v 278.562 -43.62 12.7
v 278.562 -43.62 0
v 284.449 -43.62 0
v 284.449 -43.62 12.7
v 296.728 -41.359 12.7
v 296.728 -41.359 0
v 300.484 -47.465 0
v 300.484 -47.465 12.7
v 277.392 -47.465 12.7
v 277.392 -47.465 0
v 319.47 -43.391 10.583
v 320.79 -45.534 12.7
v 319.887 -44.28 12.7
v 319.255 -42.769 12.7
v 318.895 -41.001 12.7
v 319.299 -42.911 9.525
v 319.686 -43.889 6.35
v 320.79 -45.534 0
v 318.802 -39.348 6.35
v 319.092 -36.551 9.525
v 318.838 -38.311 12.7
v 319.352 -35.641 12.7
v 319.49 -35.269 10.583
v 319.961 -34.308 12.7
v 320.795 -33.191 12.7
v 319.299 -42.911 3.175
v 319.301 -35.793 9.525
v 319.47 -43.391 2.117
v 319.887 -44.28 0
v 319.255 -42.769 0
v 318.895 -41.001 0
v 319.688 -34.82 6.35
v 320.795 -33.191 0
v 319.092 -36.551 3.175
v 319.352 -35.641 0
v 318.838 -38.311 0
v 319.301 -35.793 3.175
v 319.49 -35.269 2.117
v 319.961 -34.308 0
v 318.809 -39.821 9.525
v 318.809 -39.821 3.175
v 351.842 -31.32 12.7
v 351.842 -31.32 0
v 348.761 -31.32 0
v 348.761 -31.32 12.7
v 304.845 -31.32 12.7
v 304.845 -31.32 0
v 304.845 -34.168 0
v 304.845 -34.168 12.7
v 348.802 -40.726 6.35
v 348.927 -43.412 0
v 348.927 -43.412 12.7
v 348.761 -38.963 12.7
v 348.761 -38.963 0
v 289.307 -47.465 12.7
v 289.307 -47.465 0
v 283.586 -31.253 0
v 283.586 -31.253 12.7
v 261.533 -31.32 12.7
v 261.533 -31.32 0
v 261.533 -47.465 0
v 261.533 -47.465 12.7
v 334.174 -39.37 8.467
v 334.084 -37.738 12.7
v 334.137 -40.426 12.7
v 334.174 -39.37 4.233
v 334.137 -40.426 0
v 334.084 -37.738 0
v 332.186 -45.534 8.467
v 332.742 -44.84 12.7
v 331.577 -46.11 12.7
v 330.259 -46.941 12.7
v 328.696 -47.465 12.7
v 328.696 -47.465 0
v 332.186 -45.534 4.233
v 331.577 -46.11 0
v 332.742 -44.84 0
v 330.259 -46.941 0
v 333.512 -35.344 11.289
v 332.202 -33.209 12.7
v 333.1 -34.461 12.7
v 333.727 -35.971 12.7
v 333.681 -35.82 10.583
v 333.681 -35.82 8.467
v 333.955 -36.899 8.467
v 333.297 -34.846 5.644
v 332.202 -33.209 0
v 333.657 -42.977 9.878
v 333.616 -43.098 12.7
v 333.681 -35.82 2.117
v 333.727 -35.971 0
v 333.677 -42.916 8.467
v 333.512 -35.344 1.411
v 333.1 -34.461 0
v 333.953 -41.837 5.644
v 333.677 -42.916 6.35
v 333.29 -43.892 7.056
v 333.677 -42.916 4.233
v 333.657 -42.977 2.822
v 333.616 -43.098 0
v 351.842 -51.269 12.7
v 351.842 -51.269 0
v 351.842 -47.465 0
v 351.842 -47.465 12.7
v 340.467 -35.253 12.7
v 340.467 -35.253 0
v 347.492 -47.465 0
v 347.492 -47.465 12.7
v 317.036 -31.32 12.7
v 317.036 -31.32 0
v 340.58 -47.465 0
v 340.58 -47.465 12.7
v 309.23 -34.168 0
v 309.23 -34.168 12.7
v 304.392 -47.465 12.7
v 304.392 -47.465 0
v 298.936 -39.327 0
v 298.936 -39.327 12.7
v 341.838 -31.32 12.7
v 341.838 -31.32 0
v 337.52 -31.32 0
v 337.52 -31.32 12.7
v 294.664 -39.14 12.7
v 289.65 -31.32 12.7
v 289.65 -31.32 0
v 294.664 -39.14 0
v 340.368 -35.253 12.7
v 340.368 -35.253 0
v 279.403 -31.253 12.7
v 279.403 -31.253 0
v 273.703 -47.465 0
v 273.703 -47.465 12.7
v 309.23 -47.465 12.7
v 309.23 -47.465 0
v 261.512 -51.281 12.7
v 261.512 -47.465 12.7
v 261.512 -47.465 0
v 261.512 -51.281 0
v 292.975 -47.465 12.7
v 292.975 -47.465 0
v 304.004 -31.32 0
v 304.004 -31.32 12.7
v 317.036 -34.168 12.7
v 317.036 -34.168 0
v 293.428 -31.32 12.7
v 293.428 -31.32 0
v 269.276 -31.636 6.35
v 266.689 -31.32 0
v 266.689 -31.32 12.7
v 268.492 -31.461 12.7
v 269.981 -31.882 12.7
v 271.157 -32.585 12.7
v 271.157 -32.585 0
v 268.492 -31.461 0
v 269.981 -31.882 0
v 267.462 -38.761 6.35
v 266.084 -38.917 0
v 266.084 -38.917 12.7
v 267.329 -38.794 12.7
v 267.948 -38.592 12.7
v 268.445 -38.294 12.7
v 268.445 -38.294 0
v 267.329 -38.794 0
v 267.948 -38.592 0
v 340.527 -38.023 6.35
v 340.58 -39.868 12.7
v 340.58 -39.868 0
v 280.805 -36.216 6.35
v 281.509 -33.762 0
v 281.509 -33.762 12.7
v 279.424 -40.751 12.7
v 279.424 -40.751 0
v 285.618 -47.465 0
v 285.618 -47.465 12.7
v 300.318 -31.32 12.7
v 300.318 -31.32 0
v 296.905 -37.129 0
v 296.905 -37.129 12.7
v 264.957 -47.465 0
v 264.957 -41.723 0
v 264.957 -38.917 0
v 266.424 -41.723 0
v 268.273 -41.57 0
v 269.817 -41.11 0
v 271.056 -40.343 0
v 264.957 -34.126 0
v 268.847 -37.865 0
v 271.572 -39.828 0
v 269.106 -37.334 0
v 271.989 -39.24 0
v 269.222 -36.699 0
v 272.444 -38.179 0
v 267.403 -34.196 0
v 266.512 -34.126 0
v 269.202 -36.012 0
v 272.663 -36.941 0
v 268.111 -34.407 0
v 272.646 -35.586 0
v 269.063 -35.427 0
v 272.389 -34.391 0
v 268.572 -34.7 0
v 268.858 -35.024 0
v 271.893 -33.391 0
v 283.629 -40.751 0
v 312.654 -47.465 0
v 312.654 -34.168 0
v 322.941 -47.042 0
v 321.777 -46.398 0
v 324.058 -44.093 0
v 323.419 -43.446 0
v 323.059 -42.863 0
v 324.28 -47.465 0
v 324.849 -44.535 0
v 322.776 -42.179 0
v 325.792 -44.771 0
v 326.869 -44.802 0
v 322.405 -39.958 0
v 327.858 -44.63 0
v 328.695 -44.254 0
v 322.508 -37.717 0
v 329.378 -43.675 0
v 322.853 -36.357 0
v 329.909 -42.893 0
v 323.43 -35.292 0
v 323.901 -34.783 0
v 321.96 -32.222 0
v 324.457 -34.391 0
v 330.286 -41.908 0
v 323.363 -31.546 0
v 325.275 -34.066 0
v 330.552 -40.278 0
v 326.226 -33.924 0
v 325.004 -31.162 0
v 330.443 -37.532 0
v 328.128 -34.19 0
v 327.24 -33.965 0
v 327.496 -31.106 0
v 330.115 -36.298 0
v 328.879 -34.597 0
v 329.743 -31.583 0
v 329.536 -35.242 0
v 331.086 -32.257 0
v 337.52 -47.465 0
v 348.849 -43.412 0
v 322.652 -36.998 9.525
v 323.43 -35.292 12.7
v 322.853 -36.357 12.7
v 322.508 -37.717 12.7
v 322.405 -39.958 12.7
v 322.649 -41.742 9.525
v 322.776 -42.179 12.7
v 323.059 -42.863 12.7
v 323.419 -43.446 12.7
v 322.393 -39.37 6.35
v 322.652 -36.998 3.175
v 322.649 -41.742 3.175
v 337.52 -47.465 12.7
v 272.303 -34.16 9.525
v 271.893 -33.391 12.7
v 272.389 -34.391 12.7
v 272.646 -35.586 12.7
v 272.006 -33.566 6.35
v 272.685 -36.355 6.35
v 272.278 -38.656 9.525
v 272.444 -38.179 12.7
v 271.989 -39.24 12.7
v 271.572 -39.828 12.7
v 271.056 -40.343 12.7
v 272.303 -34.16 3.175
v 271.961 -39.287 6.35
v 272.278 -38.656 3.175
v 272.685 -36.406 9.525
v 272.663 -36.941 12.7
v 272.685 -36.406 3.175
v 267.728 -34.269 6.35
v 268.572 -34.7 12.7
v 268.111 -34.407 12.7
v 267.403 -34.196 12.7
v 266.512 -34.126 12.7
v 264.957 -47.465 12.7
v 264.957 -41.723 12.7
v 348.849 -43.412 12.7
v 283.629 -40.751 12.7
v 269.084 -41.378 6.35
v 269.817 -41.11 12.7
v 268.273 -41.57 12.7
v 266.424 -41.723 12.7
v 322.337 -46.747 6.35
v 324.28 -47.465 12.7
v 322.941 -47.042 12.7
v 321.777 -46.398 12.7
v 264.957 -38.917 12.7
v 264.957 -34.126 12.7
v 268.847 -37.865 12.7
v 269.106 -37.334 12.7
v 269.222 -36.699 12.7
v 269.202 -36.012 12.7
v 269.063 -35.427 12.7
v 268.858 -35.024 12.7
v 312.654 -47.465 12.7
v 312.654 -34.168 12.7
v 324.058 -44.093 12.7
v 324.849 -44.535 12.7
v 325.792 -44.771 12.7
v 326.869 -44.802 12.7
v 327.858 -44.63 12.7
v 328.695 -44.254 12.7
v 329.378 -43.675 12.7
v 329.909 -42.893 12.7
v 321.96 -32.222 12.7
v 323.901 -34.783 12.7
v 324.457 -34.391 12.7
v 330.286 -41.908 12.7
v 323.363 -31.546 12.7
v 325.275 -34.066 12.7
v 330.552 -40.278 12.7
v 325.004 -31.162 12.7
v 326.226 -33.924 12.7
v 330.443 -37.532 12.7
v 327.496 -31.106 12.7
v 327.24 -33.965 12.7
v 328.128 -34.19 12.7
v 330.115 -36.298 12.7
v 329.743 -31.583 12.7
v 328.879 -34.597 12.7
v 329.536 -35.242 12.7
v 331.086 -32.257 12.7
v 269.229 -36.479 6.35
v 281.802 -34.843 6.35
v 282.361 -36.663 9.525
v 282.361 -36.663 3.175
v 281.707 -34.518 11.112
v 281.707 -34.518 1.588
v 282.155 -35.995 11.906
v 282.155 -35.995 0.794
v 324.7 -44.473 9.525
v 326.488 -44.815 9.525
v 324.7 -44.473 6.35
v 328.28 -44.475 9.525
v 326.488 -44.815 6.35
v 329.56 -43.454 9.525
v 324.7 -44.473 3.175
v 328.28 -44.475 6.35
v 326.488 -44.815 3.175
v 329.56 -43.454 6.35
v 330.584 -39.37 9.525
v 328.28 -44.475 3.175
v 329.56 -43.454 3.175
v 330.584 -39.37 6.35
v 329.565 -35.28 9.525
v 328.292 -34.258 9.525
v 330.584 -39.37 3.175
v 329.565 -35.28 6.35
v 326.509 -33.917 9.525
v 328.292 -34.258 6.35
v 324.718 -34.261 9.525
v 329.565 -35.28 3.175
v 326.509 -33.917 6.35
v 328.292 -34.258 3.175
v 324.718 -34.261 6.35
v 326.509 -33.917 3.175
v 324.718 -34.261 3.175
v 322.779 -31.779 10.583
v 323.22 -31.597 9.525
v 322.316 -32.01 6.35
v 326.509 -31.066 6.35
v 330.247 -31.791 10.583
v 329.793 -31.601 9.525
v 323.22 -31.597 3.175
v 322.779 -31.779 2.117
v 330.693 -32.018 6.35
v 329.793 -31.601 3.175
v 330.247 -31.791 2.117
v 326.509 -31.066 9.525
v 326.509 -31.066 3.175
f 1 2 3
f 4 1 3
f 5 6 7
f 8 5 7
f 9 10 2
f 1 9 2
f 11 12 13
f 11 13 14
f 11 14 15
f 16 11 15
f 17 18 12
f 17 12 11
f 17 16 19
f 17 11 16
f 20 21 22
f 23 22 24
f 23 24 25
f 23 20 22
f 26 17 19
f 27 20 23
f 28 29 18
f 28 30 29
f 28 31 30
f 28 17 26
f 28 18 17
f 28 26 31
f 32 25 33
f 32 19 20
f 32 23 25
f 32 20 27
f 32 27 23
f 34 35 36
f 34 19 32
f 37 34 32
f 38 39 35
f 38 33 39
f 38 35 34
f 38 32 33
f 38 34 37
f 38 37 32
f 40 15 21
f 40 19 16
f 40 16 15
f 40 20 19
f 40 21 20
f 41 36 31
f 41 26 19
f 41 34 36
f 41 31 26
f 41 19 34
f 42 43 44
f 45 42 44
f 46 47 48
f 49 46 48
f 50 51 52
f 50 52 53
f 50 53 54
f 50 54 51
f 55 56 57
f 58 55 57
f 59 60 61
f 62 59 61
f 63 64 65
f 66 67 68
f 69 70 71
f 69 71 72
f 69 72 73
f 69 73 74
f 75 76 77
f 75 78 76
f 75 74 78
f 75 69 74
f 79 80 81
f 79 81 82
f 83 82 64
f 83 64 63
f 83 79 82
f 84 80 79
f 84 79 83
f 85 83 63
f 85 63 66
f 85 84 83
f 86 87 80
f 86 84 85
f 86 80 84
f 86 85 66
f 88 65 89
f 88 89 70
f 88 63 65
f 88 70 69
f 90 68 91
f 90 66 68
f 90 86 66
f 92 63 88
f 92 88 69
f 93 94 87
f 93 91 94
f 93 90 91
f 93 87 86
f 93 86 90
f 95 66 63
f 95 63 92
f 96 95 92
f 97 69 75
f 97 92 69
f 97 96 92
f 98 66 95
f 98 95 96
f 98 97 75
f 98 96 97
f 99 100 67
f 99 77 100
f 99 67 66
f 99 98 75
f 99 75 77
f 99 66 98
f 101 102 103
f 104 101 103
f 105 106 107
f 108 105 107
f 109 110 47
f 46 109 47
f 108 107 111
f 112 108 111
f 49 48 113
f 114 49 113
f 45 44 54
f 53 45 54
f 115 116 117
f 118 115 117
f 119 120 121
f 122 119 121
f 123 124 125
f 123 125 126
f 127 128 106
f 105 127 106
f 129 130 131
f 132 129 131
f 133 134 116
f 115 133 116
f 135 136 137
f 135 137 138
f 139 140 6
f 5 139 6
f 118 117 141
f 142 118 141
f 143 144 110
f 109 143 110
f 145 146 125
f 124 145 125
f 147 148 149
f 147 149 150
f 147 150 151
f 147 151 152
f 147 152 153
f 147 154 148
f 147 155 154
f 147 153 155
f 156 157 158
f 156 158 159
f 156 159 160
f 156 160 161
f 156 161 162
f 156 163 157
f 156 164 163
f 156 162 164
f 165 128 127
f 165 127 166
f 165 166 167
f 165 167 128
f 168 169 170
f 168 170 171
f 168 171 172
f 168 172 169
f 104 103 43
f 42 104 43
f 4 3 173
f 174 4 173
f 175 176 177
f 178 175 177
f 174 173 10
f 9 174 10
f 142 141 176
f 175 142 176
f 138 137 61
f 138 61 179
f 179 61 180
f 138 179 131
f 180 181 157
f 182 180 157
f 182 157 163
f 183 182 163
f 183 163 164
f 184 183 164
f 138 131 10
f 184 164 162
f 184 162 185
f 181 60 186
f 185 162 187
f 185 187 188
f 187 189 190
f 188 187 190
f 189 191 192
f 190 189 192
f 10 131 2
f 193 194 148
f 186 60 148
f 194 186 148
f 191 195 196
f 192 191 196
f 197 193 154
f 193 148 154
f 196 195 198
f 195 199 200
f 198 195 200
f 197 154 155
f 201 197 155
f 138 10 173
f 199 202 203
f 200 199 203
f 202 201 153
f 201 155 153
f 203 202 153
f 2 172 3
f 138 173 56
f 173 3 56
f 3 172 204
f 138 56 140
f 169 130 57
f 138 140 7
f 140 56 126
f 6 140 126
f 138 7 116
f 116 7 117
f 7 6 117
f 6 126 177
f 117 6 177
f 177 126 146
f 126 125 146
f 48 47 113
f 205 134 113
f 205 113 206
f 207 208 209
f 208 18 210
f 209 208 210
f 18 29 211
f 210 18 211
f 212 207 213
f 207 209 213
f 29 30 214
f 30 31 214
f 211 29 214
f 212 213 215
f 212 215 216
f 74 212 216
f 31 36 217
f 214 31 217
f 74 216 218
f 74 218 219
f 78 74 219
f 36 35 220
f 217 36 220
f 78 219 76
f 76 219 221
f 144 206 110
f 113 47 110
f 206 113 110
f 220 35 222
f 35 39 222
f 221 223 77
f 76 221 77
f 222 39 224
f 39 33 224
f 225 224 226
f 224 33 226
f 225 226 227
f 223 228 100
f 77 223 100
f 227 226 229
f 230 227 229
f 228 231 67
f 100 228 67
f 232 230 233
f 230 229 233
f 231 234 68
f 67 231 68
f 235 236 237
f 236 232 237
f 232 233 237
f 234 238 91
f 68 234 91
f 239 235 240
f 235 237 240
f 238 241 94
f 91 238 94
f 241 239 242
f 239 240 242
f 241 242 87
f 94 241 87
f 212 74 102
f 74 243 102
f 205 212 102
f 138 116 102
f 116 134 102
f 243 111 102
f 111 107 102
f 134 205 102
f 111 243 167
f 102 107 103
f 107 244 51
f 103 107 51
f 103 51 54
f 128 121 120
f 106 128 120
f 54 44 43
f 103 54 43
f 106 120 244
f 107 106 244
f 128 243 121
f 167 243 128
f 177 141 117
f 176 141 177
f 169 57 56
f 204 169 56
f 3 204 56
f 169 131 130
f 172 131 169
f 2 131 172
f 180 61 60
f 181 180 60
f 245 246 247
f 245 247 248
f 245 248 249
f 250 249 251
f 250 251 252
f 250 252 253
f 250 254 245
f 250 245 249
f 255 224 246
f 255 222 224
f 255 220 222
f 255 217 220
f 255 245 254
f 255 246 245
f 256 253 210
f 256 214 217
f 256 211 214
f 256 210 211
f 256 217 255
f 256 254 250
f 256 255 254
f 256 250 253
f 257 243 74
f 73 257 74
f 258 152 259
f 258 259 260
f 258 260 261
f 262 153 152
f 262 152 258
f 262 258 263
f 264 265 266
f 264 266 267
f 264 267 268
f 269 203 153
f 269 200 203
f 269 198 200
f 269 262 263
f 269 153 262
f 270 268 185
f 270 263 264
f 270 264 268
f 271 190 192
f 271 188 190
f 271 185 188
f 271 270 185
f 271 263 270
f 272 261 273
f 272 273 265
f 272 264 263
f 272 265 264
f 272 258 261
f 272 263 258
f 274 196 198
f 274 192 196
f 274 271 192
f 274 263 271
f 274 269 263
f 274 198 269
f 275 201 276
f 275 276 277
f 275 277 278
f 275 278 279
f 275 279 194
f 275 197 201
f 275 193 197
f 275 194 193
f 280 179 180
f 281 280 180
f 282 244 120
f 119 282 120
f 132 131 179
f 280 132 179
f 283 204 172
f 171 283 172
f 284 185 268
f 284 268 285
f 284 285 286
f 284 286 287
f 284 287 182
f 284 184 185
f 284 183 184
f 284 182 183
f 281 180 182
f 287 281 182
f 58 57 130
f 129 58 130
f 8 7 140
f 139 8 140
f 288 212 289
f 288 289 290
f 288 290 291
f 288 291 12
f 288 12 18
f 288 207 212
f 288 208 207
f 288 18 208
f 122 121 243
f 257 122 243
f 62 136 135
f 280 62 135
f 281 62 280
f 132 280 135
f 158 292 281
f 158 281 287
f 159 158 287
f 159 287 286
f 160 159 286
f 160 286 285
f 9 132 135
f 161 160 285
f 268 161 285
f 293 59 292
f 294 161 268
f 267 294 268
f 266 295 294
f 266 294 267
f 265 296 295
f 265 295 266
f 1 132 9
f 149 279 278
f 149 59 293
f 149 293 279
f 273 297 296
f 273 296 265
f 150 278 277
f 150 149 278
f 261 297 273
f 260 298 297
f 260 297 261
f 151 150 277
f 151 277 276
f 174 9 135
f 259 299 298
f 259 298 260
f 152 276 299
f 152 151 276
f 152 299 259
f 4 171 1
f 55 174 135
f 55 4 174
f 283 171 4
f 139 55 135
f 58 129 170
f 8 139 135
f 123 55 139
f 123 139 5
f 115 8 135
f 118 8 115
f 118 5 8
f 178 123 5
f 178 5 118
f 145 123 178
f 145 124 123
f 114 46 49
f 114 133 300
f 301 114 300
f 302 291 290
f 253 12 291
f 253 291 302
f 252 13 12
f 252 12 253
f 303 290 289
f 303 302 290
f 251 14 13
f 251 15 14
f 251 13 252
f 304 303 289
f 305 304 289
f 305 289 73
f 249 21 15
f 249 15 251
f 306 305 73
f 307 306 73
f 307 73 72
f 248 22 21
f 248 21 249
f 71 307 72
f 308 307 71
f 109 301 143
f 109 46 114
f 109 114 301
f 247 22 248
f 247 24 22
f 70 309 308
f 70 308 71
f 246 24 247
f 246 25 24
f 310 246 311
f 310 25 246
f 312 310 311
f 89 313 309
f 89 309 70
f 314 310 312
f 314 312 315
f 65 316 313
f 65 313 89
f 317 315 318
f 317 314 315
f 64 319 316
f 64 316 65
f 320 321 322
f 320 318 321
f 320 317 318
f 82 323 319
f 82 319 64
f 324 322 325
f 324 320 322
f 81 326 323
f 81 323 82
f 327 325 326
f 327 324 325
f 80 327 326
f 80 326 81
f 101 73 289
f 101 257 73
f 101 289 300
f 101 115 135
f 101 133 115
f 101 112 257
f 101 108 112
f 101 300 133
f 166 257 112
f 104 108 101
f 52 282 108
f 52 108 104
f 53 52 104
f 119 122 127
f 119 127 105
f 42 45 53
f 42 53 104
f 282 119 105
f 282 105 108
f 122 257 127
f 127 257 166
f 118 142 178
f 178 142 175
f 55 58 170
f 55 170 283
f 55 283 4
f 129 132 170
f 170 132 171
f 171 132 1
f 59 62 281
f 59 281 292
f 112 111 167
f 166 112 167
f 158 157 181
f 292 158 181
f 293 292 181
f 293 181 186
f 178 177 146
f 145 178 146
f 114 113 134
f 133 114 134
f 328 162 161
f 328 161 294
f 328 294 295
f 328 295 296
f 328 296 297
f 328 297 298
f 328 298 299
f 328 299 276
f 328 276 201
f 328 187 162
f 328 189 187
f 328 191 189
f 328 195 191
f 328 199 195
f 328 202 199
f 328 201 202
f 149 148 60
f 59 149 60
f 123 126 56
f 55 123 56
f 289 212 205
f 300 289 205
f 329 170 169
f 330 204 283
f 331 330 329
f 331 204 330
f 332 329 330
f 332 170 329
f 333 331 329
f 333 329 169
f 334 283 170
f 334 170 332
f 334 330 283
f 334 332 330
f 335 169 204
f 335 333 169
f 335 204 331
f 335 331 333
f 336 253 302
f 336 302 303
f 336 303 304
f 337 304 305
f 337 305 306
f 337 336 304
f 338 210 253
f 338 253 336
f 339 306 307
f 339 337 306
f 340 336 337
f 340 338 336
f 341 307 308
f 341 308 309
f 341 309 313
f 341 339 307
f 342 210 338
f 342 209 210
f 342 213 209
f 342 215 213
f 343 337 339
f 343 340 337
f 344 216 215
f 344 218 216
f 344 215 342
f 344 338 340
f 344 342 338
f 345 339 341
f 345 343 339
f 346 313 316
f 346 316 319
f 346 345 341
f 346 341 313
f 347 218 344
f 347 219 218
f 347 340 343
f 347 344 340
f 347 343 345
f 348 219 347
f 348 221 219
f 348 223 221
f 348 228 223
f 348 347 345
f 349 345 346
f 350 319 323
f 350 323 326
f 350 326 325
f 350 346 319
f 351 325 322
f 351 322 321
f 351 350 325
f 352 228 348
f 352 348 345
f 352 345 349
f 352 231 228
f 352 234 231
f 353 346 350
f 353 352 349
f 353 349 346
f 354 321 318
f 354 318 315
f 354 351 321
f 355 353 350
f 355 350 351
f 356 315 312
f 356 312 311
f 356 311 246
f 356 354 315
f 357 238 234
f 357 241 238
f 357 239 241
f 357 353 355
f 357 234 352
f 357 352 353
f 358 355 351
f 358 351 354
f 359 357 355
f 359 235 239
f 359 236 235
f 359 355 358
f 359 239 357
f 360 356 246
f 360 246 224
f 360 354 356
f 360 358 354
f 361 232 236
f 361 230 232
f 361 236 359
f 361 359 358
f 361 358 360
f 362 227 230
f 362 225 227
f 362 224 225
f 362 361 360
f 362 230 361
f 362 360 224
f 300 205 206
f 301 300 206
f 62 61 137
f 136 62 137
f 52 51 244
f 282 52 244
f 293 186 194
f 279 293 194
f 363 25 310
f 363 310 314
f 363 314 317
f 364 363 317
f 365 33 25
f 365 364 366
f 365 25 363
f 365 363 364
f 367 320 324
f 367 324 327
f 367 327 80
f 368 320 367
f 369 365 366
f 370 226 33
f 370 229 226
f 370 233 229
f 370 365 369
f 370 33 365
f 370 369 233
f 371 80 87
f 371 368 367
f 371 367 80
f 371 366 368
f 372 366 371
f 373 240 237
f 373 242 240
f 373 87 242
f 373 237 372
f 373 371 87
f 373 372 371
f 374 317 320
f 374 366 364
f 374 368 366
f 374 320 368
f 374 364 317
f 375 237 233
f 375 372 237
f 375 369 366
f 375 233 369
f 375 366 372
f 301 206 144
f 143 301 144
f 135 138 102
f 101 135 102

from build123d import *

# Parameters (mm, degrees)
F1_DEPTH = 12.7


# Not quite as in the source:
# - ends of sketch curves that miss each other by under 0.0002 mm in the source are joined


with BuildPart() as f1:
    # F0 (on Top) → F1 (new body)
    with BuildSketch(Plane.XY):
        with BuildLine():
            Line((261.5330806499, -47.4650785327), (261.5124285221, -47.4650785327))
            Line((261.5124285221, -47.4650785327), (261.5124285221, -51.2807406485))
            Line((261.5124285221, -51.2807406485), (351.8417477608, -51.2688159943))
            Line((351.8417477608, -51.2688159943), (351.8417477608, -47.4650785327))
            Line((351.8417477608, -47.4650785327), (347.4919441154, -47.4650785327))
            Line((347.4919441154, -47.4650785327), (340.5801815182, -47.4650785327))
            Line((340.5801815182, -47.4650785327), (337.5200657671, -47.4650785327))
            Line((337.5200657671, -47.4650785327), (328.6957807677, -47.4650785327))
            add(Edge.make_bspline(
                [(328.6957807677, -47.4650785327), (327.6809699352, -47.6876966532), (326.488101131, -47.6876966532)],
                knots=[0.6784981919, 0.6784981919, 0.6784981919, 1, 1, 1], degree=2))
            add(Edge.make_bspline(
                [(326.488101131, -47.6876966532), (325.2952323268, -47.6876966532), (324.2804214942, -47.4650785327)],
                knots=[0, 0, 0, 0.3215018081, 0.3215018081, 0.3215018081], degree=2))
            Line((324.2804214942, -47.4650785327), (312.6539750738, -47.4650785327))
            Line((312.6539750738, -47.4650785327), (309.2298963638, -47.4650785327))
            Line((309.2298963638, -47.4650785327), (304.39236927, -47.4650785327))
            Line((304.39236927, -47.4650785327), (300.4841844886, -47.4650785327))
            Line((300.4841844886, -47.4650785327), (292.9752399493, -47.4650785327))
            Line((292.9752399493, -47.4650785327), (289.3073413931, -47.4650785327))
            Line((289.3073413931, -47.4650785327), (285.6182411112, -47.4650785327))
            Line((285.6182411112, -47.4650785327), (277.391971517, -47.4650785327))
            Line((277.391971517, -47.4650785327), (273.7028712351, -47.4650785327))
            Line((273.7028712351, -47.4650785327), (264.9571593599, -47.4650785327))
            Line((264.9571593599, -47.4650785327), (261.5330806499, -47.4650785327))
        make_face()
        with BuildLine():
            Line((261.5330806499, -31.3199643679), (261.5330806499, -47.4650785327))
            Line((261.5330806499, -47.4650785327), (264.9571593599, -47.4650785327))
            Line((264.9571593599, -47.4650785327), (264.9571593599, -41.7229444732))
            Line((264.9571593599, -41.7229444732), (266.4236120581, -41.7229444732))
            add(Edge.make_bspline(
                [(271.0561891363, -40.3430654884), (269.4271898739, -41.7229444732), (266.4236120581, -41.7229444732)],
                knots=[0, 0, 0, 1, 1, 1], degree=2))
            add(Edge.make_bspline(
                [(272.6851883987, -36.3553742354), (272.6851883987, -38.9631865037), (271.0561891363, -40.3430654884)],
                knots=[0, 0, 0, 1, 1, 1], degree=2))
            add(Edge.make_bspline(
                [(271.1568973336, -32.5850006714), (272.6851883987, -33.850036975), (272.6851883987, -36.3553742354)],
                knots=[0, 0, 0, 1, 1, 1], degree=2))
            add(Edge.make_bspline(
                [(266.6886336301, -31.3199643679), (269.6286062686, -31.3199643679), (271.1568973336, -32.5850006714)],
                knots=[0, 0, 0, 1, 1, 1], degree=2))
            Line((266.6886336301, -31.3199643679), (261.5330806499, -31.3199643679))
        make_face()
        with BuildLine():
            Line((266.084384446, -38.9172494312), (264.9571593599, -38.9172494312))
            Line((264.9571593599, -38.9172494312), (264.9571593599, -34.1256594099))
            Line((264.9571593599, -34.1256594099), (266.5119525821, -34.1256594099))
            add(Edge.make_bspline(
                [(268.5720536016, -34.6998728158), (267.9148001031, -34.1256594099), (266.5119525821, -34.1256594099)],
                knots=[0, 0, 0, 1, 1, 1], degree=2))
            add(Edge.make_bspline(
                [(269.2293071001, -36.479050969), (269.2293071001, -35.2740862218), (268.5720536016, -34.6998728158)],
                knots=[0, 0, 0, 1, 1, 1], degree=2))
            add(Edge.make_bspline(
                [(268.4448432471, -38.2935653318), (269.2293071001, -37.6698812324), (269.2293071001, -36.479050969)],
                knots=[0, 0, 0, 1, 1, 1], degree=2))
            add(Edge.make_bspline(
                [(266.084384446, -38.9172494312), (267.660379394, -38.9172494312), (268.4448432471, -38.2935653318)],
                knots=[0, 0, 0, 1, 1, 1], degree=2))
        make_face(mode=Mode.SUBTRACT)
        with BuildLine():
            Line((347.4919441154, -47.4650785327), (351.8417477608, -47.4650785327))
            Line((351.8417477608, -47.4650785327), (351.8418315167, -31.3199643679))
            Line((351.8418315167, -31.3199643679), (348.7605140399, -31.3199643679))
            Line((348.7605140399, -31.3199643679), (348.7605140399, -38.9631865037))
            add(Edge.make_bspline(
                [(348.926594225, -43.4120152919), (348.7605140399, -40.2635590168), (348.7605140399, -38.9631865037)],
                knots=[0, 0, 0, 1, 1, 1], degree=2))
            Line((348.926594225, -43.4120152919), (348.8488545639, -43.4120152919))
            Line((348.8488545639, -43.4120152919), (341.8381505799, -31.3199643679))
            Line((341.8381505799, -31.3199643679), (337.5200657671, -31.3199643679))
            Line((337.5200657671, -31.3199643679), (337.5200657671, -47.4650785327))
            Line((337.5200657671, -47.4650785327), (340.5801815182, -47.4650785327))
            Line((340.5801815182, -47.4650785327), (340.5801815182, -39.8677934694))
            add(Edge.make_bspline(
                [(340.3681642606, -35.252884496), (340.5801815182, -38.4861476741), (340.5801815182, -39.8677934694)],
                knots=[0, 0, 0, 1, 1, 1], degree=2))
            Line((340.3681642606, -35.252884496), (340.4671056475, -35.252884496))
            Line((340.4671056475, -35.252884496), (347.4919441154, -47.4650785327))
        make_face()
        Polygon((279.4026018431, -31.2528255696), (273.7028712351, -47.4650785327), (277.391971517, -47.4650785327), (278.5616000547, -43.6204989286), (284.4486125735, -43.6204989286), (285.6182411112, -47.4650785327), (289.3073413931, -47.4650785327), (283.5864090594, -31.2528255696), align=None)
        with BuildLine():
            add(Edge.make_bspline(
                [(283.6288125109, -40.7511987093), (282.0068804904, -35.5285069309), (281.8019304747, -34.8429844647)],
                knots=[0, 0, 0, 1, 1, 1], degree=2))
            Line((283.6288125109, -40.7511987093), (279.4238035688, -40.7511987093))
            add(Edge.make_bspline(
                [(281.5086399351, -33.761696451), (281.1446769762, -35.1751448349), (279.4238035688, -40.7511987093)],
                knots=[0, 0, 0, 1, 1, 1], degree=2))
            add(Edge.make_bspline(
                [(281.8019304747, -34.8429844647), (281.596980459, -34.1574619985), (281.5086399351, -33.761696451)],
                knots=[0, 0, 0, 1, 1, 1], degree=2))
        make_face(mode=Mode.SUBTRACT)
        Polygon((294.664310768, -39.1398675517), (289.3073413931, -47.4650785327), (292.9752399493, -47.4650785327), (296.7279454084, -41.3589815143), (300.4841844886, -47.4650785327), (304.39236927, -47.4650785327), (298.9364585083, -39.3271494625), (304.0036709644, -31.3199643679), (300.3181043035, -31.3199643679), (296.9046264564, -37.1292372256), (293.4275434321, -31.3199643679), (289.6501026262, -31.3199643679), align=None)
        with BuildLine():
            add(Edge.make_bspline(
                [(328.6957807677, -47.4650785327), (327.6809699352, -47.6876966532), (326.488101131, -47.6876966532)],
                knots=[0.6784981919, 0.6784981919, 0.6784981919, 1, 1, 1], degree=2))
            Line((328.6957807677, -47.4650785327), (324.2804214942, -47.4650785327))
            add(Edge.make_bspline(
                [(326.488101131, -47.6876966532), (325.2952323268, -47.6876966532), (324.2804214942, -47.4650785327)],
                knots=[0, 0, 0, 0.3215018081, 0.3215018081, 0.3215018081], degree=2))
        make_face()
        with BuildLine():
            Line((324.2804214942, -47.4650785327), (328.6957807677, -47.4650785327))
            add(Edge.make_bspline(
                [(332.1860649285, -45.5339546782), (330.837439998, -46.995264714), (328.6957807677, -47.4650785327)],
                knots=[0, 0, 0, 0.6784981919, 0.6784981919, 0.6784981919], degree=2))
            add(Edge.make_bspline(
                [(334.1737267183, -39.369552914), (334.1737267183, -43.3802127033), (332.1860649285, -45.5339546782)],
                knots=[0, 0, 0, 1, 1, 1], degree=2))
            add(Edge.make_bspline(
                [(332.2019662228, -33.2086847708), (334.1737267183, -35.3518258829), (334.1737267183, -39.369552914)],
                knots=[0, 0, 0, 1, 1, 1], degree=2))
            add(Edge.make_bspline(
                [(326.5093028567, -31.0655436588), (330.2302057273, -31.0655436588), (332.2019662228, -33.2086847708)],
                knots=[0, 0, 0, 1, 1, 1], degree=2))
            add(Edge.make_bspline(
                [(320.7954377649, -33.191016666), (322.7883999862, -31.0655436588), (326.5093028567, -31.0655436588)],
                knots=[0, 0, 0, 1, 1, 1], degree=2))
            add(Edge.make_bspline(
                [(318.8024755436, -39.3483511883), (318.8024755436, -35.3164896733), (320.7954377649, -33.191016666)],
                knots=[0, 0, 0, 1, 1, 1], degree=2))
            add(Edge.make_bspline(
                [(320.7901373335, -45.5339546782), (318.8024755436, -43.3802127033), (318.8024755436, -39.3483511883)],
                knots=[0, 0, 0, 1, 1, 1], degree=2))
            add(Edge.make_bspline(
                [(324.2804214942, -47.4650785327), (322.1387622639, -46.995264714), (320.7901373335, -45.5339546782)],
                knots=[0.3215018081, 0.3215018081, 0.3215018081, 1, 1, 1], degree=2))
        make_face()
        with BuildLine():
            add(Edge.make_bspline(
                [(322.3926344387, -39.369552914), (322.3926344387, -42.0763065692), (323.4191513275, -43.445584691)],
                knots=[0, 0, 0, 1, 1, 1], degree=2))
            add(Edge.make_bspline(
                [(323.4297521903, -35.2917543266), (322.3926344387, -36.6663328799), (322.3926344387, -39.369552914)],
                knots=[0, 0, 0, 1, 1, 1], degree=2))
            add(Edge.make_bspline(
                [(326.5093028567, -33.9171757732), (324.466869942, -33.9171757732), (323.4297521903, -35.2917543266)],
                knots=[0, 0, 0, 1, 1, 1], degree=2))
            add(Edge.make_bspline(
                [(330.5835678232, -39.369552914), (330.5835678232, -33.9171757732), (326.5093028567, -33.9171757732)],
                knots=[0, 0, 0, 1, 1, 1], degree=2))
            add(Edge.make_bspline(
                [(326.488101131, -44.8148628129), (330.5835678232, -44.8148628129), (330.5835678232, -39.369552914)],
                knots=[0, 0, 0, 1, 1, 1], degree=2))
            add(Edge.make_bspline(
                [(323.4191513275, -43.445584691), (324.4456682163, -44.8148628129), (326.488101131, -44.8148628129)],
                knots=[0, 0, 0, 1, 1, 1], degree=2))
        make_face(mode=Mode.SUBTRACT)
        Polygon((309.2298963638, -47.4650785327), (312.6539750738, -47.4650785327), (312.6539750738, -34.1680628614), (317.0356650638, -34.1680628614), (317.0356650638, -31.3199643679), (304.8446727529, -31.3199643679), (304.8446727529, -34.1680628614), (309.2298963638, -34.1680628614), align=None)
    extrude(amount=F1_DEPTH)


solid = f1.part
